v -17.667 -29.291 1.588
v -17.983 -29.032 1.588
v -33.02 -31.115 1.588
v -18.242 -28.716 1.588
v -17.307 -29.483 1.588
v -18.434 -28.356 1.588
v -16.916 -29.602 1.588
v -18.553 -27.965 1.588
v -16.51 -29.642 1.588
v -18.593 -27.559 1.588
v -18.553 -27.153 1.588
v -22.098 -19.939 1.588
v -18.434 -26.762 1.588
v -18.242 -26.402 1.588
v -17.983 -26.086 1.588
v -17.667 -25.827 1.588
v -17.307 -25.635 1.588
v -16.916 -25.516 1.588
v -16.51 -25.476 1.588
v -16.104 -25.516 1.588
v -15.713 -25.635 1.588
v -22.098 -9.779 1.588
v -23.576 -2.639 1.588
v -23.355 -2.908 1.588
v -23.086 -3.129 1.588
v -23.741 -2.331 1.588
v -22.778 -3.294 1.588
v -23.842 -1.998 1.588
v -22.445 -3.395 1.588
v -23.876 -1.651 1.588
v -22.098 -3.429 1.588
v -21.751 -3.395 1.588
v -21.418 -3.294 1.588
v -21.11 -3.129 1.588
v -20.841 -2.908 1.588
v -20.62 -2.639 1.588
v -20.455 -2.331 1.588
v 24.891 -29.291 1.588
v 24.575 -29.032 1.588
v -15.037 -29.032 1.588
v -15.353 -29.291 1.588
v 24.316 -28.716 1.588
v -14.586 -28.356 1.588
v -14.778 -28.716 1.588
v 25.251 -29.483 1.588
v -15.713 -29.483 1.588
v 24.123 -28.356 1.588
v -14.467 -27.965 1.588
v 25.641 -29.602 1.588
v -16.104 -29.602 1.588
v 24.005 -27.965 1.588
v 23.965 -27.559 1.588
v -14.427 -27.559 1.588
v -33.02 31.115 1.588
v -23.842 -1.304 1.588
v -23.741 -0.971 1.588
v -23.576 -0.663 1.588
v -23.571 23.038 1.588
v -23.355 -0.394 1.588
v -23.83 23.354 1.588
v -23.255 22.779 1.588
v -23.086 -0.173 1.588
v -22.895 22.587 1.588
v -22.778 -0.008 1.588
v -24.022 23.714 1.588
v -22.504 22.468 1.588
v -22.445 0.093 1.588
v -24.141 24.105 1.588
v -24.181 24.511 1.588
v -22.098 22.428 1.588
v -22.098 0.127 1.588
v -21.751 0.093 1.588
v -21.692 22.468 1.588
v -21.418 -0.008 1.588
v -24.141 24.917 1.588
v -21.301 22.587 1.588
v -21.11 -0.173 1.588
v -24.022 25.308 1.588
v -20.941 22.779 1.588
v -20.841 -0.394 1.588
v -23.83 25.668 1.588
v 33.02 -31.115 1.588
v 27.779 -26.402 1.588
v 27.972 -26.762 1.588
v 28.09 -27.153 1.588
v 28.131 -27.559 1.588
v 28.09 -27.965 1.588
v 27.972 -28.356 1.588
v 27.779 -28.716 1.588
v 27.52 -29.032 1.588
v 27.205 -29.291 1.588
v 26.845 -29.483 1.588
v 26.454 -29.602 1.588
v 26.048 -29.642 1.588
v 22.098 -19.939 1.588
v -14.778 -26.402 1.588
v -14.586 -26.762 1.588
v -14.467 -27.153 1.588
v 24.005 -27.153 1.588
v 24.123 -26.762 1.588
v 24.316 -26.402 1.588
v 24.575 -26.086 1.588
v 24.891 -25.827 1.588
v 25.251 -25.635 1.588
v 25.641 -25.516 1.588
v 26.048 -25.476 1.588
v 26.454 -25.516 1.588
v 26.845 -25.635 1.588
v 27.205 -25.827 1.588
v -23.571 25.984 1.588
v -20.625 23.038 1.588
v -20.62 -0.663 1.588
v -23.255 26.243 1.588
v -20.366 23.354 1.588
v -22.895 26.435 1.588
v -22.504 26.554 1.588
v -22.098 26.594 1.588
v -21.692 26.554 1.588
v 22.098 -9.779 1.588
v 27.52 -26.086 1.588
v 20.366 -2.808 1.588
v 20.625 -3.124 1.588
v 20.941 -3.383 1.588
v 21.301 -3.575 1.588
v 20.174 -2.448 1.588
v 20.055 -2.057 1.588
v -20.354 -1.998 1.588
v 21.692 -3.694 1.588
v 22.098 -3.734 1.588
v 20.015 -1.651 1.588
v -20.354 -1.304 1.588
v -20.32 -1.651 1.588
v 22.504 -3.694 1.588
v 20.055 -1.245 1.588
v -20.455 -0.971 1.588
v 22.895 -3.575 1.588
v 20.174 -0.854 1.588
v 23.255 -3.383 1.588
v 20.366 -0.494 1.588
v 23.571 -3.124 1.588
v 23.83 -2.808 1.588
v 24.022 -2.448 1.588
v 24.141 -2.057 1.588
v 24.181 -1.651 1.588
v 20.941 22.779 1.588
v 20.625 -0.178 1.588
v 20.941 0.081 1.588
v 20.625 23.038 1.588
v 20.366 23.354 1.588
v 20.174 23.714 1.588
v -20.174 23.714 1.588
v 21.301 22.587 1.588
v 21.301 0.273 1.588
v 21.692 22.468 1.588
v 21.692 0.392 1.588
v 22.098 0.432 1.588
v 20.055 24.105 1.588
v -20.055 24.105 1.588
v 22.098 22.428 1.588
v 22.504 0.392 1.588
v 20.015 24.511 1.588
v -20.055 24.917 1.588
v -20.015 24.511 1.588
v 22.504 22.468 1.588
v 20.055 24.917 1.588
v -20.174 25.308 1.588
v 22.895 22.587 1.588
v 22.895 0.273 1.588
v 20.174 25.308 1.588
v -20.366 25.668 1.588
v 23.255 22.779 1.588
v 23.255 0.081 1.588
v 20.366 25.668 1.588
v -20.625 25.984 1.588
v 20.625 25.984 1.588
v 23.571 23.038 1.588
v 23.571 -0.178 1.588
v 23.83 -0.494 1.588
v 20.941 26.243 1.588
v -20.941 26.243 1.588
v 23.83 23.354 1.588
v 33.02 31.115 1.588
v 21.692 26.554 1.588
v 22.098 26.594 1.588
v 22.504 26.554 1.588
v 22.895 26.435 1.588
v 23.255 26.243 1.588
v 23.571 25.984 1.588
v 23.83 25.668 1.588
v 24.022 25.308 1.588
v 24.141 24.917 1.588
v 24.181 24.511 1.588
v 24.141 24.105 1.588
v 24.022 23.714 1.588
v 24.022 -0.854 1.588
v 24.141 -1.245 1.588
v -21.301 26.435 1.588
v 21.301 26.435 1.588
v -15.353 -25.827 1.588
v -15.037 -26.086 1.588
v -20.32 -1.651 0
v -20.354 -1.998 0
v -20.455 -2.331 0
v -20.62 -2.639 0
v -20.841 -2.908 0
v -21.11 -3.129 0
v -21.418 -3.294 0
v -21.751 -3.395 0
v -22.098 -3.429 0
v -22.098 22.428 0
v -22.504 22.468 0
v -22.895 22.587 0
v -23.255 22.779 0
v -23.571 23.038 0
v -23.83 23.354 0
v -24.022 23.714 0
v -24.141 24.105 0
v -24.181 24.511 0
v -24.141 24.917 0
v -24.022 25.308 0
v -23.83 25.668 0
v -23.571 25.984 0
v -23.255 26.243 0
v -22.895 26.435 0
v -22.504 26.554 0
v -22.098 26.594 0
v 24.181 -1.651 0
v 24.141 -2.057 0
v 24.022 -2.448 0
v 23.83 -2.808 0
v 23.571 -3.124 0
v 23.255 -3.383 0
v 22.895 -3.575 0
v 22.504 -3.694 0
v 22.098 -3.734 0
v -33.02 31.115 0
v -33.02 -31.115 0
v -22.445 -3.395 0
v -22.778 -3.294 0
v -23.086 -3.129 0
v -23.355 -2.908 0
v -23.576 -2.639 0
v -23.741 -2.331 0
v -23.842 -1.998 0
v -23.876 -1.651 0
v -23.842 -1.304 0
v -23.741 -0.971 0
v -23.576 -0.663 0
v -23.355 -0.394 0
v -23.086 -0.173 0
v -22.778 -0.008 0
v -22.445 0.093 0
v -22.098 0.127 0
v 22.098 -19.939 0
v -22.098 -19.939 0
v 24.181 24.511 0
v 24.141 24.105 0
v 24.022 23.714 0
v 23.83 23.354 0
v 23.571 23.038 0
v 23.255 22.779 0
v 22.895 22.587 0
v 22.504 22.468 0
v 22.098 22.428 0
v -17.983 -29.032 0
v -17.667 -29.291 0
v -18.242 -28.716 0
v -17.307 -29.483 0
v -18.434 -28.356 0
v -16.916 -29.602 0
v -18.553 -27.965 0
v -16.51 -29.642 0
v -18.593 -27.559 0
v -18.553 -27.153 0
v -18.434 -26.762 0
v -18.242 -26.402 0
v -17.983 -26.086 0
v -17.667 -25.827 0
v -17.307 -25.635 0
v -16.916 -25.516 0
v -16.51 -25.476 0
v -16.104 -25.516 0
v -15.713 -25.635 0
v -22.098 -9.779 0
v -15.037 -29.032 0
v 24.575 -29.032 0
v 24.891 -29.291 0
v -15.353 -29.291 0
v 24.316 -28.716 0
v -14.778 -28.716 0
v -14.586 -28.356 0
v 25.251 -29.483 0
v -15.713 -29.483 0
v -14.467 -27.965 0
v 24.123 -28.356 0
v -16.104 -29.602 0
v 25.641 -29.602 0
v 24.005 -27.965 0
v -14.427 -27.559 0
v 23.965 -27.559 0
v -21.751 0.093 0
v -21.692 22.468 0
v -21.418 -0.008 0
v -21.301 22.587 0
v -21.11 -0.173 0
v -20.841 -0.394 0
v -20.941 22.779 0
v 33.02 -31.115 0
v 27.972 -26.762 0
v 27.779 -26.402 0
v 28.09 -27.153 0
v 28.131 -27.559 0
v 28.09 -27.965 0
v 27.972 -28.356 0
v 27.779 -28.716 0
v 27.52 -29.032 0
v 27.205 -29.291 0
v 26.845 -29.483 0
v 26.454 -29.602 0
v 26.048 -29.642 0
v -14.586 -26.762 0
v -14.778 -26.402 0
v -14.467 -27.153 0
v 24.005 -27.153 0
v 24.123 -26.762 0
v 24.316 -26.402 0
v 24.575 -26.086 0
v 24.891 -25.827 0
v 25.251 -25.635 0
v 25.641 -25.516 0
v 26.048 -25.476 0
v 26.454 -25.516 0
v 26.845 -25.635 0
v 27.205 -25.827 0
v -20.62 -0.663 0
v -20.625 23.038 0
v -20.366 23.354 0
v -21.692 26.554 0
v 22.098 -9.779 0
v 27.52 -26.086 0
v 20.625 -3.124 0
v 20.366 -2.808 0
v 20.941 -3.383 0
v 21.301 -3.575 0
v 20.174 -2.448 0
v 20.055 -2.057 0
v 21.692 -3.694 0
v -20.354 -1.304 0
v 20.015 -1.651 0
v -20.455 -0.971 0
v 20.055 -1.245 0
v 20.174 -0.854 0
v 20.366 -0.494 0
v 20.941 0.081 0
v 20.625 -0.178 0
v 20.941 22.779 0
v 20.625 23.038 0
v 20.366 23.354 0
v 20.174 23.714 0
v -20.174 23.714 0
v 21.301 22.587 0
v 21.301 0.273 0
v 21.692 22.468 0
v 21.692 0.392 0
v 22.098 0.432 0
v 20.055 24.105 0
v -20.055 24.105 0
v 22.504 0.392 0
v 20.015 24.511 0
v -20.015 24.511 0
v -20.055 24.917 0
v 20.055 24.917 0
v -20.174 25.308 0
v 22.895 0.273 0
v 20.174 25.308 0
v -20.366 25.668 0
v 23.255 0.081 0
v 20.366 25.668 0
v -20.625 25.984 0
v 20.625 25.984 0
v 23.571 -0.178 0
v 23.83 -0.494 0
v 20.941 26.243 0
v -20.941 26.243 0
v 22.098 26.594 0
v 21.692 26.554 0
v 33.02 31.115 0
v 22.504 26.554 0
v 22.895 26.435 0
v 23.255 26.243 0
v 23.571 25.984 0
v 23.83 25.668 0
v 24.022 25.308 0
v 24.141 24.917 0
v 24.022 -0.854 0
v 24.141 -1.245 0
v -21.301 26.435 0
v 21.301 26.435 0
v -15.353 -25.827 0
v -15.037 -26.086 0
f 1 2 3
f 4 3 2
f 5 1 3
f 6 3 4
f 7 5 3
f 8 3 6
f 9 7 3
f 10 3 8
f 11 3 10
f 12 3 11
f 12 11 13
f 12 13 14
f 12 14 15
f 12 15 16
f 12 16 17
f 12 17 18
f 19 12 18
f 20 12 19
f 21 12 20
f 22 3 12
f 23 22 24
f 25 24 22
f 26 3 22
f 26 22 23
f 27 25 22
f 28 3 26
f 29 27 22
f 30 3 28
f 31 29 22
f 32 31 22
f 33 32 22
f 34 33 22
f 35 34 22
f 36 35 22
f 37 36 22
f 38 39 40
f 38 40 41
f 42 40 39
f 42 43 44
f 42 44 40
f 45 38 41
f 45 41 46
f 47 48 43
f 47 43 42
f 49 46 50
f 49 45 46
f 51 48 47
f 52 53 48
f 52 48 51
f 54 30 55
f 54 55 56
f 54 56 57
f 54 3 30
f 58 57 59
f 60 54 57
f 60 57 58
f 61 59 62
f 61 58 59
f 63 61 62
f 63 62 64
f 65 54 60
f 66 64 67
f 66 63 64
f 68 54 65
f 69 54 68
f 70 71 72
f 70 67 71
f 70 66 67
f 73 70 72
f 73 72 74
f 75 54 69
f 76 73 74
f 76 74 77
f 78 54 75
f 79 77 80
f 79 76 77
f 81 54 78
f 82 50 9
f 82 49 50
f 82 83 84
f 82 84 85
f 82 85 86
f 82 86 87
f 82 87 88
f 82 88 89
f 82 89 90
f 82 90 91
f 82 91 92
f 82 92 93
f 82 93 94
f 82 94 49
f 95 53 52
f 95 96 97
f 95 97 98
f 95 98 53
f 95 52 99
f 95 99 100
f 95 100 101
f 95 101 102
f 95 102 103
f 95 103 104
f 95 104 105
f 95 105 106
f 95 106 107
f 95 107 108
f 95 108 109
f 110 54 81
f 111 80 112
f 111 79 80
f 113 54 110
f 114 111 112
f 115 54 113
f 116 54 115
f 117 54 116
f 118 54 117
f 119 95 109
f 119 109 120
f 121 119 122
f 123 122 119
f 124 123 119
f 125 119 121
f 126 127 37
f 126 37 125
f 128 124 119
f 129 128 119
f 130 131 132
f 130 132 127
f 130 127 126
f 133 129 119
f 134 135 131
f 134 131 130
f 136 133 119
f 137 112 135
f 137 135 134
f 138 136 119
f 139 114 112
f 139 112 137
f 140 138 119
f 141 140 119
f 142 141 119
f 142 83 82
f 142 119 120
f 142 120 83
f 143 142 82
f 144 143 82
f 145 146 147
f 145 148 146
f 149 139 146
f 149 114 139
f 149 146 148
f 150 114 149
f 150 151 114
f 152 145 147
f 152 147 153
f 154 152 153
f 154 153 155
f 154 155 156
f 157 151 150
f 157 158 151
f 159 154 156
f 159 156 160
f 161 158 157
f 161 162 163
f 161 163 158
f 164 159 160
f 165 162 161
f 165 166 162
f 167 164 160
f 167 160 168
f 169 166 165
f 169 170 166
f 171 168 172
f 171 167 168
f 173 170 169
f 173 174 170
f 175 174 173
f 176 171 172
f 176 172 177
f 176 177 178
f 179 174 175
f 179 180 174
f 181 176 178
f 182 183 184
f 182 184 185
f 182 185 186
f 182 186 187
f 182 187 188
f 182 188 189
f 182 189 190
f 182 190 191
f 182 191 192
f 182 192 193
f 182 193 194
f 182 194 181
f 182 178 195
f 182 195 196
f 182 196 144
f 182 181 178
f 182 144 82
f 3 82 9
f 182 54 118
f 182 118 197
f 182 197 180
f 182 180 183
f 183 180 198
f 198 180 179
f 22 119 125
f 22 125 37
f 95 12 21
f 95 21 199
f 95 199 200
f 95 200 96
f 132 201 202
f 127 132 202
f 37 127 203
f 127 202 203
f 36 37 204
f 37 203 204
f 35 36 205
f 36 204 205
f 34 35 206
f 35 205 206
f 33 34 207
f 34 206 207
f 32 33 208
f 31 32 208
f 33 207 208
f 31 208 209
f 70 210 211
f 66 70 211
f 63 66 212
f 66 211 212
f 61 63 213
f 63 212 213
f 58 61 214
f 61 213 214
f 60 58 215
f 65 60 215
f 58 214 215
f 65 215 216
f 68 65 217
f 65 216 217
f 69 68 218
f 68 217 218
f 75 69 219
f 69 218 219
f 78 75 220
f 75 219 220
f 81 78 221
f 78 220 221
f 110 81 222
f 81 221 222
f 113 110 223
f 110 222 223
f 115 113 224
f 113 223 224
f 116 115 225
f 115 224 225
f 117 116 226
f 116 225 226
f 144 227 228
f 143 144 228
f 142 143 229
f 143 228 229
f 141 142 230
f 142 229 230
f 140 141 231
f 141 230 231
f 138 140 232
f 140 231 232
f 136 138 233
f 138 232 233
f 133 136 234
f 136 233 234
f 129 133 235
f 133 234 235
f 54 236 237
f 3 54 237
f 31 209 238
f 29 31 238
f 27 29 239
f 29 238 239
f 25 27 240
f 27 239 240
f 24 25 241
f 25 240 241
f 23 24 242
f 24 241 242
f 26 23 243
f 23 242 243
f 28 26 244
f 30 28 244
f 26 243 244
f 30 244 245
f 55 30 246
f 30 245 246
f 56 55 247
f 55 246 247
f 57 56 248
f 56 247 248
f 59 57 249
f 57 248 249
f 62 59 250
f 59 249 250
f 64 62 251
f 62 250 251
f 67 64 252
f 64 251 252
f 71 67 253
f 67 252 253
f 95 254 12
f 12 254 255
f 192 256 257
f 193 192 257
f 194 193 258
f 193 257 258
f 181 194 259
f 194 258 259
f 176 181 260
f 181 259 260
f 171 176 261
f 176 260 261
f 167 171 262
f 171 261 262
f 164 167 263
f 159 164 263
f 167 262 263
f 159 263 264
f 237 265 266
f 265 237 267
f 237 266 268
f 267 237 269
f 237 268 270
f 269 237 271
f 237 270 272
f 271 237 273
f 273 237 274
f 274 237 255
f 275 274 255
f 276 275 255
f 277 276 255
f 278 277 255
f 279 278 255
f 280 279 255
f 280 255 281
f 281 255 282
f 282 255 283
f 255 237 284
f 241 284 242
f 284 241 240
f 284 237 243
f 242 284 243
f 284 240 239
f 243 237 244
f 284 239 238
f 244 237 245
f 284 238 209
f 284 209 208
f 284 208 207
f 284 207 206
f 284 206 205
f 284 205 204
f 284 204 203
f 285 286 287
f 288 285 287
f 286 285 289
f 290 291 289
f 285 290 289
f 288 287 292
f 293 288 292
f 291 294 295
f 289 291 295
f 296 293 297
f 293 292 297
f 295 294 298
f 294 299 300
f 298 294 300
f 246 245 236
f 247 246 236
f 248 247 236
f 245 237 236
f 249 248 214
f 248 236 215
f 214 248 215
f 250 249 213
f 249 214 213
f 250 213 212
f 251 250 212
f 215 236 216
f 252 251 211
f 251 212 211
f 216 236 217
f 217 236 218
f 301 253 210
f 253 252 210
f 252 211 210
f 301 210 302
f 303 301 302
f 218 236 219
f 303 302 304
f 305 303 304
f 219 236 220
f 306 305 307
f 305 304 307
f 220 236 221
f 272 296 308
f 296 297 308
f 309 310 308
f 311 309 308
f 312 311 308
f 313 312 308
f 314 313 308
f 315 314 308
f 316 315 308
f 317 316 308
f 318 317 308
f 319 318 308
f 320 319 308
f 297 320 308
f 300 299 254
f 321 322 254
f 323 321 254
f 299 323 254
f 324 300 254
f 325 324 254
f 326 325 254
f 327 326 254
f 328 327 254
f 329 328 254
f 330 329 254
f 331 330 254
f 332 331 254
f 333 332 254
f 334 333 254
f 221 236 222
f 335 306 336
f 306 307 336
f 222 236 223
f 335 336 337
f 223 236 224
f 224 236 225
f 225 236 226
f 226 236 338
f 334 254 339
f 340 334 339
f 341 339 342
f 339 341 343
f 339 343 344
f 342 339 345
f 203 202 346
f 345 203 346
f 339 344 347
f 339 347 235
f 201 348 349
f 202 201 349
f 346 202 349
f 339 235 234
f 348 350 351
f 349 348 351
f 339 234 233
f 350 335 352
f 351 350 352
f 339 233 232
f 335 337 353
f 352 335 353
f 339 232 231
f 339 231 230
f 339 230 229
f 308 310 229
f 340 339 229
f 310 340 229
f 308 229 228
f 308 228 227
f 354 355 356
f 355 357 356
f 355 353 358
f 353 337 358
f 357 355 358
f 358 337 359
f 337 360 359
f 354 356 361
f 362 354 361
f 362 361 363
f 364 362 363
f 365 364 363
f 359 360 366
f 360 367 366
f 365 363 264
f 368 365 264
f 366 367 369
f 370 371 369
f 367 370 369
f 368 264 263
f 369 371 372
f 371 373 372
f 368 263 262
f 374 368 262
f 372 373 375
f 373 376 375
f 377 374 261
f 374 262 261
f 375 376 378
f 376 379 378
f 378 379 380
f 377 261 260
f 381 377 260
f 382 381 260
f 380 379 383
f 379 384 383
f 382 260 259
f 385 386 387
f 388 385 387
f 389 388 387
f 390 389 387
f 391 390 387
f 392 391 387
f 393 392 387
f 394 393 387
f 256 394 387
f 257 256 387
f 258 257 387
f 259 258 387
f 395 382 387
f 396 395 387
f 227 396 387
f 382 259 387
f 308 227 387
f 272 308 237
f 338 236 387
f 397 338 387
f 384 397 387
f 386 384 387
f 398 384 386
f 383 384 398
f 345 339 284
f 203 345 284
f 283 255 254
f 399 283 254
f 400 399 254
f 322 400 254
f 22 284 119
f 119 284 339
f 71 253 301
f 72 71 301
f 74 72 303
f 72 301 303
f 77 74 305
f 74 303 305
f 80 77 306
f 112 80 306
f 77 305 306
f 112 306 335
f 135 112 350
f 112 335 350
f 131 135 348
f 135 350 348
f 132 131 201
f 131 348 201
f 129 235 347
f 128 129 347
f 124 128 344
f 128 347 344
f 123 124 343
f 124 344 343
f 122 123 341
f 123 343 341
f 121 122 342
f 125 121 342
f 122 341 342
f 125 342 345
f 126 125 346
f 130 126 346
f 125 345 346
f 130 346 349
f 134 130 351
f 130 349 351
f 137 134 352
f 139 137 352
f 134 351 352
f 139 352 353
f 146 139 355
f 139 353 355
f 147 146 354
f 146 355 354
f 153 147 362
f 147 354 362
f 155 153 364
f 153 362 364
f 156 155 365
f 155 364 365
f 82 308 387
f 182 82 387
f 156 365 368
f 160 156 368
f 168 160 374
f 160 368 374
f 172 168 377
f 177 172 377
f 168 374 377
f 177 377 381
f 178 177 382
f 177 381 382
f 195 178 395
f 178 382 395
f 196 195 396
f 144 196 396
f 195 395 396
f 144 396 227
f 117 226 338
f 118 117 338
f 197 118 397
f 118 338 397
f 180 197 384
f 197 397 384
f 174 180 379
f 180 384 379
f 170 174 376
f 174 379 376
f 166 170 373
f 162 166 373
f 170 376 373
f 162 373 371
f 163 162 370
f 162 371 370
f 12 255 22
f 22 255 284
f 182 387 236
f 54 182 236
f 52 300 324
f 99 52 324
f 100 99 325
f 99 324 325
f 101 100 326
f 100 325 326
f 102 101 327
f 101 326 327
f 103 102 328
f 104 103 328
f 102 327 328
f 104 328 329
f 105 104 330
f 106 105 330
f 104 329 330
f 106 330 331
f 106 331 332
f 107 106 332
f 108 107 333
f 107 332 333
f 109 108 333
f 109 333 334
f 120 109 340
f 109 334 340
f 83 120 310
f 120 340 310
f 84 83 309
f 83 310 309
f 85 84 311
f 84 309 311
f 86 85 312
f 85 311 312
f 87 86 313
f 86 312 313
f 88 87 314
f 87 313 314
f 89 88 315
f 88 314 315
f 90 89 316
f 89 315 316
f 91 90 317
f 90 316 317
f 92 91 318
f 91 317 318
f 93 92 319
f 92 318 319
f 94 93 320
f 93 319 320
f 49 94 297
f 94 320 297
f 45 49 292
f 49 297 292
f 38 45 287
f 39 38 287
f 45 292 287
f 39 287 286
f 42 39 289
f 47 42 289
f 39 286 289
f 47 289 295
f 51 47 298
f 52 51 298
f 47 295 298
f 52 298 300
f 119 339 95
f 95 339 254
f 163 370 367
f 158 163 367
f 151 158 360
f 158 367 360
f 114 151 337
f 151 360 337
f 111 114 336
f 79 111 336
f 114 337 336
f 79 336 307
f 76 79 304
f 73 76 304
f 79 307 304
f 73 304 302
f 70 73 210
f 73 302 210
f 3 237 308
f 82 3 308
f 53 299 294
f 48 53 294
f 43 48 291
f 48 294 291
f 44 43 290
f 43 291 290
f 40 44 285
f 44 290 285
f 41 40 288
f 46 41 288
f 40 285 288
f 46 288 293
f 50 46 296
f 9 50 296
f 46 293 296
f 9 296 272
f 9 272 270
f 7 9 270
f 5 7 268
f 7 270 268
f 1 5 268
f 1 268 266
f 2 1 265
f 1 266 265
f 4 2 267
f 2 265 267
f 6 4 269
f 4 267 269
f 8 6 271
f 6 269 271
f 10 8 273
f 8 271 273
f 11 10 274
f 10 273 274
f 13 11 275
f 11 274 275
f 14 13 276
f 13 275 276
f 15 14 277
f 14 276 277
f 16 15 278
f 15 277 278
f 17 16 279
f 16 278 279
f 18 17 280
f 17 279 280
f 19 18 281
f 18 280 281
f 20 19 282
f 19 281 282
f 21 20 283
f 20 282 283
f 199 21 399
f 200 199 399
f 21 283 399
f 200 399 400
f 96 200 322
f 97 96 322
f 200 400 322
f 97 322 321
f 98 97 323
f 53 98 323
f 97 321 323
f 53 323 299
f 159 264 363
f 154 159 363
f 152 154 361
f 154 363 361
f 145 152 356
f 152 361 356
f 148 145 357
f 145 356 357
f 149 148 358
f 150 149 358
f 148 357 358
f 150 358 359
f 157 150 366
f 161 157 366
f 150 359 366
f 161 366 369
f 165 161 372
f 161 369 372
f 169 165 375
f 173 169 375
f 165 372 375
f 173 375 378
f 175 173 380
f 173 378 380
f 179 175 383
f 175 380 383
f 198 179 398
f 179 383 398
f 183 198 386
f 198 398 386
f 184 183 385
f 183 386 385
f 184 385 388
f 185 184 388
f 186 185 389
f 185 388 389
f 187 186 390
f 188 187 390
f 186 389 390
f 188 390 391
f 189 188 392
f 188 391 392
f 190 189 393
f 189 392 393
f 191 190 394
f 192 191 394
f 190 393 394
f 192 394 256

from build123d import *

# Parameters (mm, degrees)
F1_DEPTH = 1.5875


# Not quite as in the source:
# - a length typed as a fraction of an inch, garbled in the dataset ("3 / 203.2 mm" for 3/8 in), is restored


with BuildPart() as f1:
    # F0 (on Top) → F1 (new body)
    with BuildSketch(Plane.XY):
        with BuildLine():
            Line((22.098, 26.5938), (22.098, 31.115))
            Line((22.098, 31.115), (0, 31.115))
            Line((0, 31.115), (-22.098, 31.115))
            Line((-22.098, 31.115), (-22.098, 26.5938))
            ThreePointArc((-22.098, 26.5938), (-20.6252379961, 25.9837620039), (-20.0152, 24.511))
            ThreePointArc((-20.0152, 24.511), (-20.6252379961, 23.0382379961), (-22.098, 22.4282))
            Line((-22.098, 22.4282), (-22.098, 0.127))
            ThreePointArc((-22.098, 0.127), (-20.8407641431, -0.3937641431), (-20.32, -1.651))
            ThreePointArc((-20.32, -1.651), (-20.8407641431, -2.9082358569), (-22.098, -3.429))
            Line((-22.098, -3.429), (-22.098, -9.779))
            Line((-22.098, -9.779), (22.098, -9.779))
            Line((22.098, -9.779), (22.098, -3.7338))
            ThreePointArc((22.098, -3.7338), (20.0152, -1.651), (22.098, 0.4318))
            Line((22.098, 0.4318), (22.098, 22.4282))
            ThreePointArc((22.098, 22.4282), (20.0152, 24.511), (22.098, 26.5938))
        make_face()
        with BuildLine():
            Line((-22.098, 26.5938), (-22.098, 31.115))
            Line((-22.098, 31.115), (-33.02, 31.115))
            Line((-33.02, 31.115), (-33.02, -31.115))
            Line((-33.02, -31.115), (-22.098, -31.115))
            Line((-22.098, -31.115), (-22.098, -27.559))
            Line((-22.098, -27.559), (-22.098, -19.939))
            Line((-22.098, -19.939), (-22.098, -9.779))
            Line((-22.098, -9.779), (-22.098, -3.429))
            ThreePointArc((-22.098, -3.429), (-23.876, -1.651), (-22.098, 0.127))
            Line((-22.098, 0.127), (-22.098, 22.4282))
            ThreePointArc((-22.098, 22.4282), (-24.1808, 24.511), (-22.098, 26.5938))
        make_face()
        with BuildLine():
            Line((33.02, -27.559), (33.02, 31.115))
            Line((33.02, 31.115), (22.098, 31.115))
            Line((22.098, 31.115), (22.098, 26.5938))
            ThreePointArc((22.098, 26.5938), (23.5707620039, 25.9837620039), (24.1808, 24.511))
            ThreePointArc((24.1808, 24.511), (23.5707620039, 23.0382379961), (22.098, 22.4282))
            Line((22.098, 22.4282), (22.098, 0.4318))
            ThreePointArc((22.098, 0.4318), (23.5707620039, -0.1782379961), (24.1808, -1.651))
            ThreePointArc((24.1808, -1.651), (23.5707620039, -3.1237620039), (22.098, -3.7338))
            Line((22.098, -3.7338), (22.098, -9.779))
            Line((22.098, -9.779), (22.098, -19.939))
            Line((22.098, -19.939), (22.098, -27.559))
            Line((22.098, -27.559), (23.9649, -27.559))
            ThreePointArc((23.9649, -27.559), (26.0477, -25.4762), (28.1305, -27.559))
            Line((28.1305, -27.559), (33.02, -27.559))
        make_face()
        with BuildLine():
            Line((33.02, -31.115), (33.02, -27.559))
            Line((33.02, -27.559), (28.1305, -27.559))
            ThreePointArc((28.1305, -27.559), (26.0477, -29.6418), (23.9649, -27.559))
            Line((23.9649, -27.559), (22.098, -27.559))
            Line((22.098, -27.559), (22.098, -31.115))
            Line((22.098, -31.115), (33.02, -31.115))
        make_face()
        with BuildLine():
            Line((-14.4272, -27.559), (22.098, -27.559))
            Line((22.098, -27.559), (22.098, -19.939))
            Line((22.098, -19.939), (-22.098, -19.939))
            Line((-22.098, -19.939), (-22.098, -27.559))
            Line((-22.098, -27.559), (-18.5928, -27.559))
            ThreePointArc((-18.5928, -27.559), (-16.51, -25.4762), (-14.4272, -27.559))
        make_face()
        with BuildLine():
            Line((-22.098, -31.115), (22.098, -31.115))
            Line((22.098, -31.115), (22.098, -27.559))
            Line((22.098, -27.559), (-14.4272, -27.559))
            ThreePointArc((-14.4272, -27.559), (-16.51, -29.6418), (-18.5928, -27.559))
            Line((-18.5928, -27.559), (-22.098, -27.559))
            Line((-22.098, -27.559), (-22.098, -31.115))
        make_face()
    extrude(amount=F1_DEPTH)


solid = f1.part
